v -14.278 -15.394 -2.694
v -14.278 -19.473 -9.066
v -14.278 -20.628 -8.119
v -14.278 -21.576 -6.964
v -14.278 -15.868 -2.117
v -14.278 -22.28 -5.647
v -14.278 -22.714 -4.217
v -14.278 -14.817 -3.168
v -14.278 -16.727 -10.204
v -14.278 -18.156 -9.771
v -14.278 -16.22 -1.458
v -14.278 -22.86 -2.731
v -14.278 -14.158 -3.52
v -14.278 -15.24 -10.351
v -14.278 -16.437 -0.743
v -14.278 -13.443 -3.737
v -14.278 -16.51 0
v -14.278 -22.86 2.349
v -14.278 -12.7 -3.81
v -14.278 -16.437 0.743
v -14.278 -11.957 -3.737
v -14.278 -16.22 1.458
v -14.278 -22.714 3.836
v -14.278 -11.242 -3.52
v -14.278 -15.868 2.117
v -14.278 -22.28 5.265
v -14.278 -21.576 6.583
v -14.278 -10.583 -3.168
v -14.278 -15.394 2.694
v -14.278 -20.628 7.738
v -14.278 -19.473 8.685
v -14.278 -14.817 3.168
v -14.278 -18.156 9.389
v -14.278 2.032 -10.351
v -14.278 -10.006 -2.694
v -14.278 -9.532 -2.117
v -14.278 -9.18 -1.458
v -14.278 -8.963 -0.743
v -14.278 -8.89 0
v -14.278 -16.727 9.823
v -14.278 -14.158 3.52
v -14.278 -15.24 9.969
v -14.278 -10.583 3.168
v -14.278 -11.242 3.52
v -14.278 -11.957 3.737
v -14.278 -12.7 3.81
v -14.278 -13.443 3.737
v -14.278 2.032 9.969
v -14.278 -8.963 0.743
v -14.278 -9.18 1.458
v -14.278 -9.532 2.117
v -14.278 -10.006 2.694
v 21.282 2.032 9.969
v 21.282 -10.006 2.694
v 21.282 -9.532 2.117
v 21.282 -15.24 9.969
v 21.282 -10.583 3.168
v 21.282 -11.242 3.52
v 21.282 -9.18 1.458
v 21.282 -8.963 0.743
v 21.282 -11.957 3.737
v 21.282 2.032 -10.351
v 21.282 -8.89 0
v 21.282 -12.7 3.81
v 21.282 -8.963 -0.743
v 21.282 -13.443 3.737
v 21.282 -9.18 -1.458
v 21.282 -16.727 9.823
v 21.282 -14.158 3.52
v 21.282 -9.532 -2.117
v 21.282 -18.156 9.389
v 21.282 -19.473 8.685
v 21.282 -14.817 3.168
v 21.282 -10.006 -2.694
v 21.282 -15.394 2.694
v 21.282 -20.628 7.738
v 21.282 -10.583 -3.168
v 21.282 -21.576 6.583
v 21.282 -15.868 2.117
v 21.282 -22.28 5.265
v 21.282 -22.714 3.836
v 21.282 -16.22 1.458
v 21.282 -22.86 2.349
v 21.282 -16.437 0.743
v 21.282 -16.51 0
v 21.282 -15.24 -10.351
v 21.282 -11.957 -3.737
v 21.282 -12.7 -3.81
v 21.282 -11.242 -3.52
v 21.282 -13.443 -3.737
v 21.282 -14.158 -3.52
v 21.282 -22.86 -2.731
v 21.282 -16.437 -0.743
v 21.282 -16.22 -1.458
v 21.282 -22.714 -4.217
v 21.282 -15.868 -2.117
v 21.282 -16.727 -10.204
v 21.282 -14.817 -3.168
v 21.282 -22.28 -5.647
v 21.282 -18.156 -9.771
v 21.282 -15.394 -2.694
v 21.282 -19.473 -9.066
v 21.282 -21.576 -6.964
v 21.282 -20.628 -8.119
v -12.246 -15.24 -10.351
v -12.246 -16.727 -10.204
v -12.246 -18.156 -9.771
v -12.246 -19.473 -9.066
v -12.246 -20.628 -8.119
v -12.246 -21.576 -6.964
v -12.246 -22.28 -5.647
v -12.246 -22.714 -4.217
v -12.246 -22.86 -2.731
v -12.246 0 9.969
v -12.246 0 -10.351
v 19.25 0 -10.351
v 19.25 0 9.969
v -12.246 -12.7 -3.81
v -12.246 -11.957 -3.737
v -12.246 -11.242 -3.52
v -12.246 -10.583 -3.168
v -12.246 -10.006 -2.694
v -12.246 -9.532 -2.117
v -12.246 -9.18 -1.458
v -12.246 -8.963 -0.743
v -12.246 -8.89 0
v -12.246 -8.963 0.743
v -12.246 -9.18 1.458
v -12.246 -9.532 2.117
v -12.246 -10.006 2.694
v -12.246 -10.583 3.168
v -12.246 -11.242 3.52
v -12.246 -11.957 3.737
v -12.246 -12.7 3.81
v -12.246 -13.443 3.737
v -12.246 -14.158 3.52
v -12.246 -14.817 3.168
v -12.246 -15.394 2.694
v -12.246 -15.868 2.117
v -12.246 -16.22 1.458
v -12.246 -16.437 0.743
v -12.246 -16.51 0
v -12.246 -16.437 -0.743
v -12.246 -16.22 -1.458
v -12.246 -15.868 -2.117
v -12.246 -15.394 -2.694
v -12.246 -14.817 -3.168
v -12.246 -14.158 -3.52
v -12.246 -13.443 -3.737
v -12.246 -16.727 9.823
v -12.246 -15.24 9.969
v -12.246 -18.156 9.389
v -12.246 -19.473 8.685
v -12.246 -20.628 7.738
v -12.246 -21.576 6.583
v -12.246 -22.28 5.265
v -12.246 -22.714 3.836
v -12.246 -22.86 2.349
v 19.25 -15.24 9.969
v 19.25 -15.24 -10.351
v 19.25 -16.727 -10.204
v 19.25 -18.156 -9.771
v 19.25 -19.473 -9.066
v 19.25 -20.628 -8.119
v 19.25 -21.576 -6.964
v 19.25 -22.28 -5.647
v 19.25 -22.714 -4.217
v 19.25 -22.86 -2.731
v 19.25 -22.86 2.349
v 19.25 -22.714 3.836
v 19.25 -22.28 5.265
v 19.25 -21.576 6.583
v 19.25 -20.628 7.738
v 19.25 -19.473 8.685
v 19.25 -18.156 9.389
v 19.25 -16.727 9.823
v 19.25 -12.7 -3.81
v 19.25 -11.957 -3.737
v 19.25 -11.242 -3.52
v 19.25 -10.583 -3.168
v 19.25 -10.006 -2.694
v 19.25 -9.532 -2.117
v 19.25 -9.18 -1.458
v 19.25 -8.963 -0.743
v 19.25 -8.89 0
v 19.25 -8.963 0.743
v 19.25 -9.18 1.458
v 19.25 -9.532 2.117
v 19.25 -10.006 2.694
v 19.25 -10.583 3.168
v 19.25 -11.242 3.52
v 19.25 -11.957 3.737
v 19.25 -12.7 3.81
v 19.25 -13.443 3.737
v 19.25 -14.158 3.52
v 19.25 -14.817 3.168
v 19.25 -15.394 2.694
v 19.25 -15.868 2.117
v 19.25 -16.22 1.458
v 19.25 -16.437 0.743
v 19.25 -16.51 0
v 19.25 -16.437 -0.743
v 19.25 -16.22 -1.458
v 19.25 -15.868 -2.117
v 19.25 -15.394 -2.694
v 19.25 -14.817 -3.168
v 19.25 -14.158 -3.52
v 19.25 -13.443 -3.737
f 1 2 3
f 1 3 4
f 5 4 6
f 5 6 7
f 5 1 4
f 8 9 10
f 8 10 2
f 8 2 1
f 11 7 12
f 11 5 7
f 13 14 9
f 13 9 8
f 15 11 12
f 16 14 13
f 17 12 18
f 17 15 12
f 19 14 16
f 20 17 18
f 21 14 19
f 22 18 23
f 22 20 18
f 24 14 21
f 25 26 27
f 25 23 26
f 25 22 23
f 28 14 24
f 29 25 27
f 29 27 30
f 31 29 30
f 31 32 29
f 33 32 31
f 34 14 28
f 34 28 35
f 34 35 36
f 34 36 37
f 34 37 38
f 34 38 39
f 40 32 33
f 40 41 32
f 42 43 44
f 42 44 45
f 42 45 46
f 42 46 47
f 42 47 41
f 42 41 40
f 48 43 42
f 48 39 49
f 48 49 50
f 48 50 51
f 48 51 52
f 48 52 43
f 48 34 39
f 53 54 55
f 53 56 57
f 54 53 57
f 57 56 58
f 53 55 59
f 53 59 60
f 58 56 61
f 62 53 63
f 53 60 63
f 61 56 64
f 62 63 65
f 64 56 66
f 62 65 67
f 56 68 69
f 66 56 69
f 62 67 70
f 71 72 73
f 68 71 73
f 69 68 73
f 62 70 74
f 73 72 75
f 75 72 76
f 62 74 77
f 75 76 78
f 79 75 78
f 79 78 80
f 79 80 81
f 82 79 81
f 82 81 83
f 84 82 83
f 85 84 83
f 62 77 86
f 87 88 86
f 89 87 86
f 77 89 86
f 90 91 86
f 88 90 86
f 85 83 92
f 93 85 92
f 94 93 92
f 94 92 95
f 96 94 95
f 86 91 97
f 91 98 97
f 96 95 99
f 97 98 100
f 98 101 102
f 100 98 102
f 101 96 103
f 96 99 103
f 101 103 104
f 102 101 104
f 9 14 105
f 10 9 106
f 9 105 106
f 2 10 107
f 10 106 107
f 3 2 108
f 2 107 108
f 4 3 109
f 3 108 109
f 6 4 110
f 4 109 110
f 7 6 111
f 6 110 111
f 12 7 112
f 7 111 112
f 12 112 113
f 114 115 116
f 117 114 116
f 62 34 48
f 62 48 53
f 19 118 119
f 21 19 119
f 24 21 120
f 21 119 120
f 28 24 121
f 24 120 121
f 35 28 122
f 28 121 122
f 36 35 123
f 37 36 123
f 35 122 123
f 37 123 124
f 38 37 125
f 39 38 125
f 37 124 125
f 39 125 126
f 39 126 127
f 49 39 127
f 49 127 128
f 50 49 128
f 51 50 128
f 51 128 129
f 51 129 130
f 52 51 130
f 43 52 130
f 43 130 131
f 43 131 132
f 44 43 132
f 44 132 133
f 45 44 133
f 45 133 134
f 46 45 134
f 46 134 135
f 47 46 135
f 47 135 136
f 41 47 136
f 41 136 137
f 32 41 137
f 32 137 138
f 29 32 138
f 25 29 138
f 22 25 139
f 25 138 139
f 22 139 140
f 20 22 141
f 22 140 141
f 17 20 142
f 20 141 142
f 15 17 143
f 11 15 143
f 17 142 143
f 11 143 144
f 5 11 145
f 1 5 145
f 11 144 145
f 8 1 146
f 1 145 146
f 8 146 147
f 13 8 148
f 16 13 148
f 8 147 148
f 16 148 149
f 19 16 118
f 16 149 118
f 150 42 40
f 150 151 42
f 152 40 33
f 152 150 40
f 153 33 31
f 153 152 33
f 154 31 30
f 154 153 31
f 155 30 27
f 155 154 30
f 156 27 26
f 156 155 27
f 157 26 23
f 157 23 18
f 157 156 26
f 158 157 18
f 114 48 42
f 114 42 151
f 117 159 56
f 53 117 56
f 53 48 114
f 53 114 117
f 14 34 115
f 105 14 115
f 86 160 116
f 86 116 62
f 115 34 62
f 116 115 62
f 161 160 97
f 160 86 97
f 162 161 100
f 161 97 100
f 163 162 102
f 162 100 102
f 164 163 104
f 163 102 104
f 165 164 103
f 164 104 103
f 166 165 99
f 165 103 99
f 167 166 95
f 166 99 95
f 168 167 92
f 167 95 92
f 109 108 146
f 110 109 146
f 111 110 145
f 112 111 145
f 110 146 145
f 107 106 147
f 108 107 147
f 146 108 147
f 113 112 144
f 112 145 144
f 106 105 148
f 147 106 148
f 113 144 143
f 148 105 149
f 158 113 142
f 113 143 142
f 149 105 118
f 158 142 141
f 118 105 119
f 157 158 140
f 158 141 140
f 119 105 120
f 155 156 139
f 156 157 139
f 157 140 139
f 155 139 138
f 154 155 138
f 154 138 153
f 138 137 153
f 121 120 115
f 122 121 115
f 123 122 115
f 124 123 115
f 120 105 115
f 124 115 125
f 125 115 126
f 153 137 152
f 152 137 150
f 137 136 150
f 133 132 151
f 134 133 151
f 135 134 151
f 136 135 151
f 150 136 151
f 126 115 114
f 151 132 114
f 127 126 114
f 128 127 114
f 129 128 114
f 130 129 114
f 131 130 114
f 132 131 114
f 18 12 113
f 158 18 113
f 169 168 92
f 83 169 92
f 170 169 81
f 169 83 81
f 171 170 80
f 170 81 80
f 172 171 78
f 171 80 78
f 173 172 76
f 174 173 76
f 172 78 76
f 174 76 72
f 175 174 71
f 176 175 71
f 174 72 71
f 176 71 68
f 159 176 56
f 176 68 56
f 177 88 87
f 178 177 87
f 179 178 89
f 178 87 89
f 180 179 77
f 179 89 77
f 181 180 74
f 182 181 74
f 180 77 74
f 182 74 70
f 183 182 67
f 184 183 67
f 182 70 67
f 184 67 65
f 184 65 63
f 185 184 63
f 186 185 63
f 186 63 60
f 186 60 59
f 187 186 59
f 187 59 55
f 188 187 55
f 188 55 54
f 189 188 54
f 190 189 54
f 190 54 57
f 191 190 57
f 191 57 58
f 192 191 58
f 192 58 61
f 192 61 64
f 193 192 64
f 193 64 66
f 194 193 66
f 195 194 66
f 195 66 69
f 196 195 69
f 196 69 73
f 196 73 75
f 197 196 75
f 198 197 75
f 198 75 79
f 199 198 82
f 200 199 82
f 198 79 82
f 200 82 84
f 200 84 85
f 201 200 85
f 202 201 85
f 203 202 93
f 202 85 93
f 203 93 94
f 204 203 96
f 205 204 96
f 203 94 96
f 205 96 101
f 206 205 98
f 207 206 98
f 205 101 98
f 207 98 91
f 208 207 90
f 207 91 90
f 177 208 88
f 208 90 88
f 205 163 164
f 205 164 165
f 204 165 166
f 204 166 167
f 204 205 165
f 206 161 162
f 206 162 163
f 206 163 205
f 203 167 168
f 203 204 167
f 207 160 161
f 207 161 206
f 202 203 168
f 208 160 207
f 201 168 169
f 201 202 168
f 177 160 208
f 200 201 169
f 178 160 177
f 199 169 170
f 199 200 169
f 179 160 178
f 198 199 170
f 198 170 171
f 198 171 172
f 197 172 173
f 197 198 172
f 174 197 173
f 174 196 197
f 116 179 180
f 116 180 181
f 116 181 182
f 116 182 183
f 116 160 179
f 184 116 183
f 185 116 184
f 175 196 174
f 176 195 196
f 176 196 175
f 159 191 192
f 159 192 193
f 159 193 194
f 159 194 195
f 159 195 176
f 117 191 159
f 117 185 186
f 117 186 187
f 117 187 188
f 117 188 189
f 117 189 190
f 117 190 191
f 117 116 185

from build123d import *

# Parameters (mm, degrees)
SKETCH1_W           = 35.56
SKETCH1_H           = 20.32
BOSS_EXTRUDE1_DEPTH = 2.032
SKETCH2_W           = 2.032
SKETCH2_H           = 20.32
BOSS_EXTRUDE2_DEPTH = 22.86
FILLET1_R           = 7.62
SKETCH3_R           = 3.81
CUT_EXTRUDE1_DEPTH  = 49.022


with BuildPart() as part:
    # Sketch1 → Boss-Extrude1 (new body)
    with BuildSketch(Plane(origin=(0, 0, 0), x_dir=(1, 0, 0), z_dir=(0, 1, 0))):
        with Locations((3.501518098, 0.190585347)):
            Rectangle(SKETCH1_W, SKETCH1_H)
    extrude(amount=BOSS_EXTRUDE1_DEPTH)

    # Sketch2 → Boss-Extrude2 (add)
    with BuildSketch(Plane.XZ):
        with Locations((-13.262481902, -0.190585347)):
            Rectangle(SKETCH2_W, SKETCH2_H)
        with Locations((20.265518098, -0.190585347)):
            Rectangle(SKETCH2_W, SKETCH2_H)
    extrude(amount=BOSS_EXTRUDE2_DEPTH)

    # Fillet1
    fillet1_edges = [part.edges().sort_by_distance(p)[0] for p in [
        (-13.262481902, -22.86, -10.350585347),
        (-13.262481902, -22.86, 9.969414653),
        (20.265518098, -22.86, 9.969414653),
        (20.265518098, -22.86, -10.350585347),
    ]]
    fillet(fillet1_edges, radius=FILLET1_R)

    # Sketch3 → Cut-Extrude1 (cut)
    with BuildSketch(Plane(origin=(21.281518098, 0, 0), x_dir=(0, 0, -1), z_dir=(1, 0, 0))):
        with Locations((0, -12.7)):
            Circle(SKETCH3_R)
    extrude(amount=-CUT_EXTRUDE1_DEPTH, mode=Mode.SUBTRACT)


solid = part.part
